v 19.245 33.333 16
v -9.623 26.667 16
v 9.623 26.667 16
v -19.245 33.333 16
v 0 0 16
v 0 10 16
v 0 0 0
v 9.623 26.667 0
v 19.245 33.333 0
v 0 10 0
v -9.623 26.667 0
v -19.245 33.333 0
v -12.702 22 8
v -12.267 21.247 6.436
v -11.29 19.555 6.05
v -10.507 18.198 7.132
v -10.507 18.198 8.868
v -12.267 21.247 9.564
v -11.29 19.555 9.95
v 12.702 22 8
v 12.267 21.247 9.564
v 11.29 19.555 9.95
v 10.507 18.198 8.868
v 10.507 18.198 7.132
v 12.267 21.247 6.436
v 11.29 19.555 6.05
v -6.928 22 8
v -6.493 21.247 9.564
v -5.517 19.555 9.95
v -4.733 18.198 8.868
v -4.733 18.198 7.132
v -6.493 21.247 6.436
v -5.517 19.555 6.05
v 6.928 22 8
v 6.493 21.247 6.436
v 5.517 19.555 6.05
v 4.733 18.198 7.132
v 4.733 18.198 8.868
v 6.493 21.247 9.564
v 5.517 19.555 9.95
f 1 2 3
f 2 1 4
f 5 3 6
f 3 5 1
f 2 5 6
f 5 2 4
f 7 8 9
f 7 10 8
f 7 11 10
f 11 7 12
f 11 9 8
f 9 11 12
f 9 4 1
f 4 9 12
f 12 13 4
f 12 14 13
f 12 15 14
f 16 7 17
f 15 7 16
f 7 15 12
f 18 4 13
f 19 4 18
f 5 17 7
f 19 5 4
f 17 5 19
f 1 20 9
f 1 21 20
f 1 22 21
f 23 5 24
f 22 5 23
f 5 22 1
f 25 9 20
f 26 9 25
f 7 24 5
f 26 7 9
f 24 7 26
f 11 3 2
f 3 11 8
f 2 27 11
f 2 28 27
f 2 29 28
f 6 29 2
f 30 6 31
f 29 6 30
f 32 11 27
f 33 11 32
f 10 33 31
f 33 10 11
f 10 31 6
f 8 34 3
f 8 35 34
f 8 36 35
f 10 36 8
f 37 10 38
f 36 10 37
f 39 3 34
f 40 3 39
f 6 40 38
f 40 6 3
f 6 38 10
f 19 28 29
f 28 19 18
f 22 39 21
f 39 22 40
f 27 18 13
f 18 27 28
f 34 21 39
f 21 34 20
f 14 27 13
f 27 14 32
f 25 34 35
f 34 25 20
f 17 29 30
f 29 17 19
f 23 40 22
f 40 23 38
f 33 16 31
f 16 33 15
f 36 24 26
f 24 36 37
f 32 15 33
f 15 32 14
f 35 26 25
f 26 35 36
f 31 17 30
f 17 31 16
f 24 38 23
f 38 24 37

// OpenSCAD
// file: ../params.scad
/*
 * Copyright (c) 2012 Haydn Vesta
 * 
 * See the file license.txt for copying permission.
 * 
 */

// GLOBAL
hole_radius = 5;
peg_radius = 4.5;

// MAGNET
mag_height = 6.4;
mag_ring_ir = 50;
mag_ring_or = 102;
mag_count = 16;

// BEARING
bearing_height = 25;
bearing_ir = 34;
bearing_or = 43;

// STATOR
stator_height = 16;
stator_inner_height = stator_height/2;
stator_count = 6;
stator_incidence = 360/stator_count;
stator_radius = 115;
stator_tab_width = 10;
stator_tab_offset = 50;
stator_wiring_gap = 25;
stator_wiring_gap_inset = stator_radius - (stator_wiring_gap + 10);
stator_outer_tab_extrude = 15;
stator_outer_tab_width = 30;
stator_notch = 15;
stator_notch_width = 5;
coil_edge = 80;
coil_block_length = 70;

// ROTOR & ROTOR CAP
rotor_height = mag_height + 2;
rotor_inner_height = 3;
rotor_radius = 105;
rotor_inner_radius = 20;
rotor_count = 8;
rotor_incidence = 360/rotor_count;
rotor_tie_hole_offset = 30;
rotor_tab_excess = 8;

rotor_cap_radius = 50;
rotor_cap_peg_radius = 35;
rotor_cap_inner_radius = 10;
rotor_cap_height = 10;
rotor_cap_insert_height = 10;
rotor_cap_bearing_inset = (bearing_height + rotor_inner_height) - rotor_cap_height;
rotor_plate_height = 5;
blade_holder_edge = 20;
rotor_peg_width = 12;
rotor_peg_height = (rotor_height * 2) + (rotor_cap_height * 2) + stator_height;

// ROTOR EDGE TIE
rotor_edge_tie_length = 40;
rotor_edge_tie_width = 20;
rotor_edge_tie_inner_height = 5;
rotor_edge_tie_height = rotor_height + rotor_plate_height;
rotor_edge_tie_peg_inset = 10;
// main file
/*
 * Copyright (c) 2012 Haydn Vesta
 * 
 * See the file license.txt for copying permission.
 *
 */

include <../params.scad>


chuck_edge = coil_edge/2;

module chuck_whole() {
  difference() {
    translate([chuck_edge/-2, 0, 0])
      cube([chuck_edge, chuck_edge/1.2, stator_height]);
    rotate([0, 0, 120]) cube([chuck_edge, chuck_edge, stator_height]);
    mirror([0, 1, 0]) {
      rotate([0, 0, 300]) cube([chuck_edge, chuck_edge, stator_height]);
    }
  }
}

module chuck() {
  difference() {
    chuck_whole();
    translate([0, chuck_edge/4, 0]) scale([0.5, 0.5, 1]) chuck_whole();
    translate([chuck_edge/-2, chuck_edge/2, stator_height/2]) {
      rotate([90, 0, 90]) cylinder(h=chuck_edge, r=2);
    }
  }
}

chuck();
